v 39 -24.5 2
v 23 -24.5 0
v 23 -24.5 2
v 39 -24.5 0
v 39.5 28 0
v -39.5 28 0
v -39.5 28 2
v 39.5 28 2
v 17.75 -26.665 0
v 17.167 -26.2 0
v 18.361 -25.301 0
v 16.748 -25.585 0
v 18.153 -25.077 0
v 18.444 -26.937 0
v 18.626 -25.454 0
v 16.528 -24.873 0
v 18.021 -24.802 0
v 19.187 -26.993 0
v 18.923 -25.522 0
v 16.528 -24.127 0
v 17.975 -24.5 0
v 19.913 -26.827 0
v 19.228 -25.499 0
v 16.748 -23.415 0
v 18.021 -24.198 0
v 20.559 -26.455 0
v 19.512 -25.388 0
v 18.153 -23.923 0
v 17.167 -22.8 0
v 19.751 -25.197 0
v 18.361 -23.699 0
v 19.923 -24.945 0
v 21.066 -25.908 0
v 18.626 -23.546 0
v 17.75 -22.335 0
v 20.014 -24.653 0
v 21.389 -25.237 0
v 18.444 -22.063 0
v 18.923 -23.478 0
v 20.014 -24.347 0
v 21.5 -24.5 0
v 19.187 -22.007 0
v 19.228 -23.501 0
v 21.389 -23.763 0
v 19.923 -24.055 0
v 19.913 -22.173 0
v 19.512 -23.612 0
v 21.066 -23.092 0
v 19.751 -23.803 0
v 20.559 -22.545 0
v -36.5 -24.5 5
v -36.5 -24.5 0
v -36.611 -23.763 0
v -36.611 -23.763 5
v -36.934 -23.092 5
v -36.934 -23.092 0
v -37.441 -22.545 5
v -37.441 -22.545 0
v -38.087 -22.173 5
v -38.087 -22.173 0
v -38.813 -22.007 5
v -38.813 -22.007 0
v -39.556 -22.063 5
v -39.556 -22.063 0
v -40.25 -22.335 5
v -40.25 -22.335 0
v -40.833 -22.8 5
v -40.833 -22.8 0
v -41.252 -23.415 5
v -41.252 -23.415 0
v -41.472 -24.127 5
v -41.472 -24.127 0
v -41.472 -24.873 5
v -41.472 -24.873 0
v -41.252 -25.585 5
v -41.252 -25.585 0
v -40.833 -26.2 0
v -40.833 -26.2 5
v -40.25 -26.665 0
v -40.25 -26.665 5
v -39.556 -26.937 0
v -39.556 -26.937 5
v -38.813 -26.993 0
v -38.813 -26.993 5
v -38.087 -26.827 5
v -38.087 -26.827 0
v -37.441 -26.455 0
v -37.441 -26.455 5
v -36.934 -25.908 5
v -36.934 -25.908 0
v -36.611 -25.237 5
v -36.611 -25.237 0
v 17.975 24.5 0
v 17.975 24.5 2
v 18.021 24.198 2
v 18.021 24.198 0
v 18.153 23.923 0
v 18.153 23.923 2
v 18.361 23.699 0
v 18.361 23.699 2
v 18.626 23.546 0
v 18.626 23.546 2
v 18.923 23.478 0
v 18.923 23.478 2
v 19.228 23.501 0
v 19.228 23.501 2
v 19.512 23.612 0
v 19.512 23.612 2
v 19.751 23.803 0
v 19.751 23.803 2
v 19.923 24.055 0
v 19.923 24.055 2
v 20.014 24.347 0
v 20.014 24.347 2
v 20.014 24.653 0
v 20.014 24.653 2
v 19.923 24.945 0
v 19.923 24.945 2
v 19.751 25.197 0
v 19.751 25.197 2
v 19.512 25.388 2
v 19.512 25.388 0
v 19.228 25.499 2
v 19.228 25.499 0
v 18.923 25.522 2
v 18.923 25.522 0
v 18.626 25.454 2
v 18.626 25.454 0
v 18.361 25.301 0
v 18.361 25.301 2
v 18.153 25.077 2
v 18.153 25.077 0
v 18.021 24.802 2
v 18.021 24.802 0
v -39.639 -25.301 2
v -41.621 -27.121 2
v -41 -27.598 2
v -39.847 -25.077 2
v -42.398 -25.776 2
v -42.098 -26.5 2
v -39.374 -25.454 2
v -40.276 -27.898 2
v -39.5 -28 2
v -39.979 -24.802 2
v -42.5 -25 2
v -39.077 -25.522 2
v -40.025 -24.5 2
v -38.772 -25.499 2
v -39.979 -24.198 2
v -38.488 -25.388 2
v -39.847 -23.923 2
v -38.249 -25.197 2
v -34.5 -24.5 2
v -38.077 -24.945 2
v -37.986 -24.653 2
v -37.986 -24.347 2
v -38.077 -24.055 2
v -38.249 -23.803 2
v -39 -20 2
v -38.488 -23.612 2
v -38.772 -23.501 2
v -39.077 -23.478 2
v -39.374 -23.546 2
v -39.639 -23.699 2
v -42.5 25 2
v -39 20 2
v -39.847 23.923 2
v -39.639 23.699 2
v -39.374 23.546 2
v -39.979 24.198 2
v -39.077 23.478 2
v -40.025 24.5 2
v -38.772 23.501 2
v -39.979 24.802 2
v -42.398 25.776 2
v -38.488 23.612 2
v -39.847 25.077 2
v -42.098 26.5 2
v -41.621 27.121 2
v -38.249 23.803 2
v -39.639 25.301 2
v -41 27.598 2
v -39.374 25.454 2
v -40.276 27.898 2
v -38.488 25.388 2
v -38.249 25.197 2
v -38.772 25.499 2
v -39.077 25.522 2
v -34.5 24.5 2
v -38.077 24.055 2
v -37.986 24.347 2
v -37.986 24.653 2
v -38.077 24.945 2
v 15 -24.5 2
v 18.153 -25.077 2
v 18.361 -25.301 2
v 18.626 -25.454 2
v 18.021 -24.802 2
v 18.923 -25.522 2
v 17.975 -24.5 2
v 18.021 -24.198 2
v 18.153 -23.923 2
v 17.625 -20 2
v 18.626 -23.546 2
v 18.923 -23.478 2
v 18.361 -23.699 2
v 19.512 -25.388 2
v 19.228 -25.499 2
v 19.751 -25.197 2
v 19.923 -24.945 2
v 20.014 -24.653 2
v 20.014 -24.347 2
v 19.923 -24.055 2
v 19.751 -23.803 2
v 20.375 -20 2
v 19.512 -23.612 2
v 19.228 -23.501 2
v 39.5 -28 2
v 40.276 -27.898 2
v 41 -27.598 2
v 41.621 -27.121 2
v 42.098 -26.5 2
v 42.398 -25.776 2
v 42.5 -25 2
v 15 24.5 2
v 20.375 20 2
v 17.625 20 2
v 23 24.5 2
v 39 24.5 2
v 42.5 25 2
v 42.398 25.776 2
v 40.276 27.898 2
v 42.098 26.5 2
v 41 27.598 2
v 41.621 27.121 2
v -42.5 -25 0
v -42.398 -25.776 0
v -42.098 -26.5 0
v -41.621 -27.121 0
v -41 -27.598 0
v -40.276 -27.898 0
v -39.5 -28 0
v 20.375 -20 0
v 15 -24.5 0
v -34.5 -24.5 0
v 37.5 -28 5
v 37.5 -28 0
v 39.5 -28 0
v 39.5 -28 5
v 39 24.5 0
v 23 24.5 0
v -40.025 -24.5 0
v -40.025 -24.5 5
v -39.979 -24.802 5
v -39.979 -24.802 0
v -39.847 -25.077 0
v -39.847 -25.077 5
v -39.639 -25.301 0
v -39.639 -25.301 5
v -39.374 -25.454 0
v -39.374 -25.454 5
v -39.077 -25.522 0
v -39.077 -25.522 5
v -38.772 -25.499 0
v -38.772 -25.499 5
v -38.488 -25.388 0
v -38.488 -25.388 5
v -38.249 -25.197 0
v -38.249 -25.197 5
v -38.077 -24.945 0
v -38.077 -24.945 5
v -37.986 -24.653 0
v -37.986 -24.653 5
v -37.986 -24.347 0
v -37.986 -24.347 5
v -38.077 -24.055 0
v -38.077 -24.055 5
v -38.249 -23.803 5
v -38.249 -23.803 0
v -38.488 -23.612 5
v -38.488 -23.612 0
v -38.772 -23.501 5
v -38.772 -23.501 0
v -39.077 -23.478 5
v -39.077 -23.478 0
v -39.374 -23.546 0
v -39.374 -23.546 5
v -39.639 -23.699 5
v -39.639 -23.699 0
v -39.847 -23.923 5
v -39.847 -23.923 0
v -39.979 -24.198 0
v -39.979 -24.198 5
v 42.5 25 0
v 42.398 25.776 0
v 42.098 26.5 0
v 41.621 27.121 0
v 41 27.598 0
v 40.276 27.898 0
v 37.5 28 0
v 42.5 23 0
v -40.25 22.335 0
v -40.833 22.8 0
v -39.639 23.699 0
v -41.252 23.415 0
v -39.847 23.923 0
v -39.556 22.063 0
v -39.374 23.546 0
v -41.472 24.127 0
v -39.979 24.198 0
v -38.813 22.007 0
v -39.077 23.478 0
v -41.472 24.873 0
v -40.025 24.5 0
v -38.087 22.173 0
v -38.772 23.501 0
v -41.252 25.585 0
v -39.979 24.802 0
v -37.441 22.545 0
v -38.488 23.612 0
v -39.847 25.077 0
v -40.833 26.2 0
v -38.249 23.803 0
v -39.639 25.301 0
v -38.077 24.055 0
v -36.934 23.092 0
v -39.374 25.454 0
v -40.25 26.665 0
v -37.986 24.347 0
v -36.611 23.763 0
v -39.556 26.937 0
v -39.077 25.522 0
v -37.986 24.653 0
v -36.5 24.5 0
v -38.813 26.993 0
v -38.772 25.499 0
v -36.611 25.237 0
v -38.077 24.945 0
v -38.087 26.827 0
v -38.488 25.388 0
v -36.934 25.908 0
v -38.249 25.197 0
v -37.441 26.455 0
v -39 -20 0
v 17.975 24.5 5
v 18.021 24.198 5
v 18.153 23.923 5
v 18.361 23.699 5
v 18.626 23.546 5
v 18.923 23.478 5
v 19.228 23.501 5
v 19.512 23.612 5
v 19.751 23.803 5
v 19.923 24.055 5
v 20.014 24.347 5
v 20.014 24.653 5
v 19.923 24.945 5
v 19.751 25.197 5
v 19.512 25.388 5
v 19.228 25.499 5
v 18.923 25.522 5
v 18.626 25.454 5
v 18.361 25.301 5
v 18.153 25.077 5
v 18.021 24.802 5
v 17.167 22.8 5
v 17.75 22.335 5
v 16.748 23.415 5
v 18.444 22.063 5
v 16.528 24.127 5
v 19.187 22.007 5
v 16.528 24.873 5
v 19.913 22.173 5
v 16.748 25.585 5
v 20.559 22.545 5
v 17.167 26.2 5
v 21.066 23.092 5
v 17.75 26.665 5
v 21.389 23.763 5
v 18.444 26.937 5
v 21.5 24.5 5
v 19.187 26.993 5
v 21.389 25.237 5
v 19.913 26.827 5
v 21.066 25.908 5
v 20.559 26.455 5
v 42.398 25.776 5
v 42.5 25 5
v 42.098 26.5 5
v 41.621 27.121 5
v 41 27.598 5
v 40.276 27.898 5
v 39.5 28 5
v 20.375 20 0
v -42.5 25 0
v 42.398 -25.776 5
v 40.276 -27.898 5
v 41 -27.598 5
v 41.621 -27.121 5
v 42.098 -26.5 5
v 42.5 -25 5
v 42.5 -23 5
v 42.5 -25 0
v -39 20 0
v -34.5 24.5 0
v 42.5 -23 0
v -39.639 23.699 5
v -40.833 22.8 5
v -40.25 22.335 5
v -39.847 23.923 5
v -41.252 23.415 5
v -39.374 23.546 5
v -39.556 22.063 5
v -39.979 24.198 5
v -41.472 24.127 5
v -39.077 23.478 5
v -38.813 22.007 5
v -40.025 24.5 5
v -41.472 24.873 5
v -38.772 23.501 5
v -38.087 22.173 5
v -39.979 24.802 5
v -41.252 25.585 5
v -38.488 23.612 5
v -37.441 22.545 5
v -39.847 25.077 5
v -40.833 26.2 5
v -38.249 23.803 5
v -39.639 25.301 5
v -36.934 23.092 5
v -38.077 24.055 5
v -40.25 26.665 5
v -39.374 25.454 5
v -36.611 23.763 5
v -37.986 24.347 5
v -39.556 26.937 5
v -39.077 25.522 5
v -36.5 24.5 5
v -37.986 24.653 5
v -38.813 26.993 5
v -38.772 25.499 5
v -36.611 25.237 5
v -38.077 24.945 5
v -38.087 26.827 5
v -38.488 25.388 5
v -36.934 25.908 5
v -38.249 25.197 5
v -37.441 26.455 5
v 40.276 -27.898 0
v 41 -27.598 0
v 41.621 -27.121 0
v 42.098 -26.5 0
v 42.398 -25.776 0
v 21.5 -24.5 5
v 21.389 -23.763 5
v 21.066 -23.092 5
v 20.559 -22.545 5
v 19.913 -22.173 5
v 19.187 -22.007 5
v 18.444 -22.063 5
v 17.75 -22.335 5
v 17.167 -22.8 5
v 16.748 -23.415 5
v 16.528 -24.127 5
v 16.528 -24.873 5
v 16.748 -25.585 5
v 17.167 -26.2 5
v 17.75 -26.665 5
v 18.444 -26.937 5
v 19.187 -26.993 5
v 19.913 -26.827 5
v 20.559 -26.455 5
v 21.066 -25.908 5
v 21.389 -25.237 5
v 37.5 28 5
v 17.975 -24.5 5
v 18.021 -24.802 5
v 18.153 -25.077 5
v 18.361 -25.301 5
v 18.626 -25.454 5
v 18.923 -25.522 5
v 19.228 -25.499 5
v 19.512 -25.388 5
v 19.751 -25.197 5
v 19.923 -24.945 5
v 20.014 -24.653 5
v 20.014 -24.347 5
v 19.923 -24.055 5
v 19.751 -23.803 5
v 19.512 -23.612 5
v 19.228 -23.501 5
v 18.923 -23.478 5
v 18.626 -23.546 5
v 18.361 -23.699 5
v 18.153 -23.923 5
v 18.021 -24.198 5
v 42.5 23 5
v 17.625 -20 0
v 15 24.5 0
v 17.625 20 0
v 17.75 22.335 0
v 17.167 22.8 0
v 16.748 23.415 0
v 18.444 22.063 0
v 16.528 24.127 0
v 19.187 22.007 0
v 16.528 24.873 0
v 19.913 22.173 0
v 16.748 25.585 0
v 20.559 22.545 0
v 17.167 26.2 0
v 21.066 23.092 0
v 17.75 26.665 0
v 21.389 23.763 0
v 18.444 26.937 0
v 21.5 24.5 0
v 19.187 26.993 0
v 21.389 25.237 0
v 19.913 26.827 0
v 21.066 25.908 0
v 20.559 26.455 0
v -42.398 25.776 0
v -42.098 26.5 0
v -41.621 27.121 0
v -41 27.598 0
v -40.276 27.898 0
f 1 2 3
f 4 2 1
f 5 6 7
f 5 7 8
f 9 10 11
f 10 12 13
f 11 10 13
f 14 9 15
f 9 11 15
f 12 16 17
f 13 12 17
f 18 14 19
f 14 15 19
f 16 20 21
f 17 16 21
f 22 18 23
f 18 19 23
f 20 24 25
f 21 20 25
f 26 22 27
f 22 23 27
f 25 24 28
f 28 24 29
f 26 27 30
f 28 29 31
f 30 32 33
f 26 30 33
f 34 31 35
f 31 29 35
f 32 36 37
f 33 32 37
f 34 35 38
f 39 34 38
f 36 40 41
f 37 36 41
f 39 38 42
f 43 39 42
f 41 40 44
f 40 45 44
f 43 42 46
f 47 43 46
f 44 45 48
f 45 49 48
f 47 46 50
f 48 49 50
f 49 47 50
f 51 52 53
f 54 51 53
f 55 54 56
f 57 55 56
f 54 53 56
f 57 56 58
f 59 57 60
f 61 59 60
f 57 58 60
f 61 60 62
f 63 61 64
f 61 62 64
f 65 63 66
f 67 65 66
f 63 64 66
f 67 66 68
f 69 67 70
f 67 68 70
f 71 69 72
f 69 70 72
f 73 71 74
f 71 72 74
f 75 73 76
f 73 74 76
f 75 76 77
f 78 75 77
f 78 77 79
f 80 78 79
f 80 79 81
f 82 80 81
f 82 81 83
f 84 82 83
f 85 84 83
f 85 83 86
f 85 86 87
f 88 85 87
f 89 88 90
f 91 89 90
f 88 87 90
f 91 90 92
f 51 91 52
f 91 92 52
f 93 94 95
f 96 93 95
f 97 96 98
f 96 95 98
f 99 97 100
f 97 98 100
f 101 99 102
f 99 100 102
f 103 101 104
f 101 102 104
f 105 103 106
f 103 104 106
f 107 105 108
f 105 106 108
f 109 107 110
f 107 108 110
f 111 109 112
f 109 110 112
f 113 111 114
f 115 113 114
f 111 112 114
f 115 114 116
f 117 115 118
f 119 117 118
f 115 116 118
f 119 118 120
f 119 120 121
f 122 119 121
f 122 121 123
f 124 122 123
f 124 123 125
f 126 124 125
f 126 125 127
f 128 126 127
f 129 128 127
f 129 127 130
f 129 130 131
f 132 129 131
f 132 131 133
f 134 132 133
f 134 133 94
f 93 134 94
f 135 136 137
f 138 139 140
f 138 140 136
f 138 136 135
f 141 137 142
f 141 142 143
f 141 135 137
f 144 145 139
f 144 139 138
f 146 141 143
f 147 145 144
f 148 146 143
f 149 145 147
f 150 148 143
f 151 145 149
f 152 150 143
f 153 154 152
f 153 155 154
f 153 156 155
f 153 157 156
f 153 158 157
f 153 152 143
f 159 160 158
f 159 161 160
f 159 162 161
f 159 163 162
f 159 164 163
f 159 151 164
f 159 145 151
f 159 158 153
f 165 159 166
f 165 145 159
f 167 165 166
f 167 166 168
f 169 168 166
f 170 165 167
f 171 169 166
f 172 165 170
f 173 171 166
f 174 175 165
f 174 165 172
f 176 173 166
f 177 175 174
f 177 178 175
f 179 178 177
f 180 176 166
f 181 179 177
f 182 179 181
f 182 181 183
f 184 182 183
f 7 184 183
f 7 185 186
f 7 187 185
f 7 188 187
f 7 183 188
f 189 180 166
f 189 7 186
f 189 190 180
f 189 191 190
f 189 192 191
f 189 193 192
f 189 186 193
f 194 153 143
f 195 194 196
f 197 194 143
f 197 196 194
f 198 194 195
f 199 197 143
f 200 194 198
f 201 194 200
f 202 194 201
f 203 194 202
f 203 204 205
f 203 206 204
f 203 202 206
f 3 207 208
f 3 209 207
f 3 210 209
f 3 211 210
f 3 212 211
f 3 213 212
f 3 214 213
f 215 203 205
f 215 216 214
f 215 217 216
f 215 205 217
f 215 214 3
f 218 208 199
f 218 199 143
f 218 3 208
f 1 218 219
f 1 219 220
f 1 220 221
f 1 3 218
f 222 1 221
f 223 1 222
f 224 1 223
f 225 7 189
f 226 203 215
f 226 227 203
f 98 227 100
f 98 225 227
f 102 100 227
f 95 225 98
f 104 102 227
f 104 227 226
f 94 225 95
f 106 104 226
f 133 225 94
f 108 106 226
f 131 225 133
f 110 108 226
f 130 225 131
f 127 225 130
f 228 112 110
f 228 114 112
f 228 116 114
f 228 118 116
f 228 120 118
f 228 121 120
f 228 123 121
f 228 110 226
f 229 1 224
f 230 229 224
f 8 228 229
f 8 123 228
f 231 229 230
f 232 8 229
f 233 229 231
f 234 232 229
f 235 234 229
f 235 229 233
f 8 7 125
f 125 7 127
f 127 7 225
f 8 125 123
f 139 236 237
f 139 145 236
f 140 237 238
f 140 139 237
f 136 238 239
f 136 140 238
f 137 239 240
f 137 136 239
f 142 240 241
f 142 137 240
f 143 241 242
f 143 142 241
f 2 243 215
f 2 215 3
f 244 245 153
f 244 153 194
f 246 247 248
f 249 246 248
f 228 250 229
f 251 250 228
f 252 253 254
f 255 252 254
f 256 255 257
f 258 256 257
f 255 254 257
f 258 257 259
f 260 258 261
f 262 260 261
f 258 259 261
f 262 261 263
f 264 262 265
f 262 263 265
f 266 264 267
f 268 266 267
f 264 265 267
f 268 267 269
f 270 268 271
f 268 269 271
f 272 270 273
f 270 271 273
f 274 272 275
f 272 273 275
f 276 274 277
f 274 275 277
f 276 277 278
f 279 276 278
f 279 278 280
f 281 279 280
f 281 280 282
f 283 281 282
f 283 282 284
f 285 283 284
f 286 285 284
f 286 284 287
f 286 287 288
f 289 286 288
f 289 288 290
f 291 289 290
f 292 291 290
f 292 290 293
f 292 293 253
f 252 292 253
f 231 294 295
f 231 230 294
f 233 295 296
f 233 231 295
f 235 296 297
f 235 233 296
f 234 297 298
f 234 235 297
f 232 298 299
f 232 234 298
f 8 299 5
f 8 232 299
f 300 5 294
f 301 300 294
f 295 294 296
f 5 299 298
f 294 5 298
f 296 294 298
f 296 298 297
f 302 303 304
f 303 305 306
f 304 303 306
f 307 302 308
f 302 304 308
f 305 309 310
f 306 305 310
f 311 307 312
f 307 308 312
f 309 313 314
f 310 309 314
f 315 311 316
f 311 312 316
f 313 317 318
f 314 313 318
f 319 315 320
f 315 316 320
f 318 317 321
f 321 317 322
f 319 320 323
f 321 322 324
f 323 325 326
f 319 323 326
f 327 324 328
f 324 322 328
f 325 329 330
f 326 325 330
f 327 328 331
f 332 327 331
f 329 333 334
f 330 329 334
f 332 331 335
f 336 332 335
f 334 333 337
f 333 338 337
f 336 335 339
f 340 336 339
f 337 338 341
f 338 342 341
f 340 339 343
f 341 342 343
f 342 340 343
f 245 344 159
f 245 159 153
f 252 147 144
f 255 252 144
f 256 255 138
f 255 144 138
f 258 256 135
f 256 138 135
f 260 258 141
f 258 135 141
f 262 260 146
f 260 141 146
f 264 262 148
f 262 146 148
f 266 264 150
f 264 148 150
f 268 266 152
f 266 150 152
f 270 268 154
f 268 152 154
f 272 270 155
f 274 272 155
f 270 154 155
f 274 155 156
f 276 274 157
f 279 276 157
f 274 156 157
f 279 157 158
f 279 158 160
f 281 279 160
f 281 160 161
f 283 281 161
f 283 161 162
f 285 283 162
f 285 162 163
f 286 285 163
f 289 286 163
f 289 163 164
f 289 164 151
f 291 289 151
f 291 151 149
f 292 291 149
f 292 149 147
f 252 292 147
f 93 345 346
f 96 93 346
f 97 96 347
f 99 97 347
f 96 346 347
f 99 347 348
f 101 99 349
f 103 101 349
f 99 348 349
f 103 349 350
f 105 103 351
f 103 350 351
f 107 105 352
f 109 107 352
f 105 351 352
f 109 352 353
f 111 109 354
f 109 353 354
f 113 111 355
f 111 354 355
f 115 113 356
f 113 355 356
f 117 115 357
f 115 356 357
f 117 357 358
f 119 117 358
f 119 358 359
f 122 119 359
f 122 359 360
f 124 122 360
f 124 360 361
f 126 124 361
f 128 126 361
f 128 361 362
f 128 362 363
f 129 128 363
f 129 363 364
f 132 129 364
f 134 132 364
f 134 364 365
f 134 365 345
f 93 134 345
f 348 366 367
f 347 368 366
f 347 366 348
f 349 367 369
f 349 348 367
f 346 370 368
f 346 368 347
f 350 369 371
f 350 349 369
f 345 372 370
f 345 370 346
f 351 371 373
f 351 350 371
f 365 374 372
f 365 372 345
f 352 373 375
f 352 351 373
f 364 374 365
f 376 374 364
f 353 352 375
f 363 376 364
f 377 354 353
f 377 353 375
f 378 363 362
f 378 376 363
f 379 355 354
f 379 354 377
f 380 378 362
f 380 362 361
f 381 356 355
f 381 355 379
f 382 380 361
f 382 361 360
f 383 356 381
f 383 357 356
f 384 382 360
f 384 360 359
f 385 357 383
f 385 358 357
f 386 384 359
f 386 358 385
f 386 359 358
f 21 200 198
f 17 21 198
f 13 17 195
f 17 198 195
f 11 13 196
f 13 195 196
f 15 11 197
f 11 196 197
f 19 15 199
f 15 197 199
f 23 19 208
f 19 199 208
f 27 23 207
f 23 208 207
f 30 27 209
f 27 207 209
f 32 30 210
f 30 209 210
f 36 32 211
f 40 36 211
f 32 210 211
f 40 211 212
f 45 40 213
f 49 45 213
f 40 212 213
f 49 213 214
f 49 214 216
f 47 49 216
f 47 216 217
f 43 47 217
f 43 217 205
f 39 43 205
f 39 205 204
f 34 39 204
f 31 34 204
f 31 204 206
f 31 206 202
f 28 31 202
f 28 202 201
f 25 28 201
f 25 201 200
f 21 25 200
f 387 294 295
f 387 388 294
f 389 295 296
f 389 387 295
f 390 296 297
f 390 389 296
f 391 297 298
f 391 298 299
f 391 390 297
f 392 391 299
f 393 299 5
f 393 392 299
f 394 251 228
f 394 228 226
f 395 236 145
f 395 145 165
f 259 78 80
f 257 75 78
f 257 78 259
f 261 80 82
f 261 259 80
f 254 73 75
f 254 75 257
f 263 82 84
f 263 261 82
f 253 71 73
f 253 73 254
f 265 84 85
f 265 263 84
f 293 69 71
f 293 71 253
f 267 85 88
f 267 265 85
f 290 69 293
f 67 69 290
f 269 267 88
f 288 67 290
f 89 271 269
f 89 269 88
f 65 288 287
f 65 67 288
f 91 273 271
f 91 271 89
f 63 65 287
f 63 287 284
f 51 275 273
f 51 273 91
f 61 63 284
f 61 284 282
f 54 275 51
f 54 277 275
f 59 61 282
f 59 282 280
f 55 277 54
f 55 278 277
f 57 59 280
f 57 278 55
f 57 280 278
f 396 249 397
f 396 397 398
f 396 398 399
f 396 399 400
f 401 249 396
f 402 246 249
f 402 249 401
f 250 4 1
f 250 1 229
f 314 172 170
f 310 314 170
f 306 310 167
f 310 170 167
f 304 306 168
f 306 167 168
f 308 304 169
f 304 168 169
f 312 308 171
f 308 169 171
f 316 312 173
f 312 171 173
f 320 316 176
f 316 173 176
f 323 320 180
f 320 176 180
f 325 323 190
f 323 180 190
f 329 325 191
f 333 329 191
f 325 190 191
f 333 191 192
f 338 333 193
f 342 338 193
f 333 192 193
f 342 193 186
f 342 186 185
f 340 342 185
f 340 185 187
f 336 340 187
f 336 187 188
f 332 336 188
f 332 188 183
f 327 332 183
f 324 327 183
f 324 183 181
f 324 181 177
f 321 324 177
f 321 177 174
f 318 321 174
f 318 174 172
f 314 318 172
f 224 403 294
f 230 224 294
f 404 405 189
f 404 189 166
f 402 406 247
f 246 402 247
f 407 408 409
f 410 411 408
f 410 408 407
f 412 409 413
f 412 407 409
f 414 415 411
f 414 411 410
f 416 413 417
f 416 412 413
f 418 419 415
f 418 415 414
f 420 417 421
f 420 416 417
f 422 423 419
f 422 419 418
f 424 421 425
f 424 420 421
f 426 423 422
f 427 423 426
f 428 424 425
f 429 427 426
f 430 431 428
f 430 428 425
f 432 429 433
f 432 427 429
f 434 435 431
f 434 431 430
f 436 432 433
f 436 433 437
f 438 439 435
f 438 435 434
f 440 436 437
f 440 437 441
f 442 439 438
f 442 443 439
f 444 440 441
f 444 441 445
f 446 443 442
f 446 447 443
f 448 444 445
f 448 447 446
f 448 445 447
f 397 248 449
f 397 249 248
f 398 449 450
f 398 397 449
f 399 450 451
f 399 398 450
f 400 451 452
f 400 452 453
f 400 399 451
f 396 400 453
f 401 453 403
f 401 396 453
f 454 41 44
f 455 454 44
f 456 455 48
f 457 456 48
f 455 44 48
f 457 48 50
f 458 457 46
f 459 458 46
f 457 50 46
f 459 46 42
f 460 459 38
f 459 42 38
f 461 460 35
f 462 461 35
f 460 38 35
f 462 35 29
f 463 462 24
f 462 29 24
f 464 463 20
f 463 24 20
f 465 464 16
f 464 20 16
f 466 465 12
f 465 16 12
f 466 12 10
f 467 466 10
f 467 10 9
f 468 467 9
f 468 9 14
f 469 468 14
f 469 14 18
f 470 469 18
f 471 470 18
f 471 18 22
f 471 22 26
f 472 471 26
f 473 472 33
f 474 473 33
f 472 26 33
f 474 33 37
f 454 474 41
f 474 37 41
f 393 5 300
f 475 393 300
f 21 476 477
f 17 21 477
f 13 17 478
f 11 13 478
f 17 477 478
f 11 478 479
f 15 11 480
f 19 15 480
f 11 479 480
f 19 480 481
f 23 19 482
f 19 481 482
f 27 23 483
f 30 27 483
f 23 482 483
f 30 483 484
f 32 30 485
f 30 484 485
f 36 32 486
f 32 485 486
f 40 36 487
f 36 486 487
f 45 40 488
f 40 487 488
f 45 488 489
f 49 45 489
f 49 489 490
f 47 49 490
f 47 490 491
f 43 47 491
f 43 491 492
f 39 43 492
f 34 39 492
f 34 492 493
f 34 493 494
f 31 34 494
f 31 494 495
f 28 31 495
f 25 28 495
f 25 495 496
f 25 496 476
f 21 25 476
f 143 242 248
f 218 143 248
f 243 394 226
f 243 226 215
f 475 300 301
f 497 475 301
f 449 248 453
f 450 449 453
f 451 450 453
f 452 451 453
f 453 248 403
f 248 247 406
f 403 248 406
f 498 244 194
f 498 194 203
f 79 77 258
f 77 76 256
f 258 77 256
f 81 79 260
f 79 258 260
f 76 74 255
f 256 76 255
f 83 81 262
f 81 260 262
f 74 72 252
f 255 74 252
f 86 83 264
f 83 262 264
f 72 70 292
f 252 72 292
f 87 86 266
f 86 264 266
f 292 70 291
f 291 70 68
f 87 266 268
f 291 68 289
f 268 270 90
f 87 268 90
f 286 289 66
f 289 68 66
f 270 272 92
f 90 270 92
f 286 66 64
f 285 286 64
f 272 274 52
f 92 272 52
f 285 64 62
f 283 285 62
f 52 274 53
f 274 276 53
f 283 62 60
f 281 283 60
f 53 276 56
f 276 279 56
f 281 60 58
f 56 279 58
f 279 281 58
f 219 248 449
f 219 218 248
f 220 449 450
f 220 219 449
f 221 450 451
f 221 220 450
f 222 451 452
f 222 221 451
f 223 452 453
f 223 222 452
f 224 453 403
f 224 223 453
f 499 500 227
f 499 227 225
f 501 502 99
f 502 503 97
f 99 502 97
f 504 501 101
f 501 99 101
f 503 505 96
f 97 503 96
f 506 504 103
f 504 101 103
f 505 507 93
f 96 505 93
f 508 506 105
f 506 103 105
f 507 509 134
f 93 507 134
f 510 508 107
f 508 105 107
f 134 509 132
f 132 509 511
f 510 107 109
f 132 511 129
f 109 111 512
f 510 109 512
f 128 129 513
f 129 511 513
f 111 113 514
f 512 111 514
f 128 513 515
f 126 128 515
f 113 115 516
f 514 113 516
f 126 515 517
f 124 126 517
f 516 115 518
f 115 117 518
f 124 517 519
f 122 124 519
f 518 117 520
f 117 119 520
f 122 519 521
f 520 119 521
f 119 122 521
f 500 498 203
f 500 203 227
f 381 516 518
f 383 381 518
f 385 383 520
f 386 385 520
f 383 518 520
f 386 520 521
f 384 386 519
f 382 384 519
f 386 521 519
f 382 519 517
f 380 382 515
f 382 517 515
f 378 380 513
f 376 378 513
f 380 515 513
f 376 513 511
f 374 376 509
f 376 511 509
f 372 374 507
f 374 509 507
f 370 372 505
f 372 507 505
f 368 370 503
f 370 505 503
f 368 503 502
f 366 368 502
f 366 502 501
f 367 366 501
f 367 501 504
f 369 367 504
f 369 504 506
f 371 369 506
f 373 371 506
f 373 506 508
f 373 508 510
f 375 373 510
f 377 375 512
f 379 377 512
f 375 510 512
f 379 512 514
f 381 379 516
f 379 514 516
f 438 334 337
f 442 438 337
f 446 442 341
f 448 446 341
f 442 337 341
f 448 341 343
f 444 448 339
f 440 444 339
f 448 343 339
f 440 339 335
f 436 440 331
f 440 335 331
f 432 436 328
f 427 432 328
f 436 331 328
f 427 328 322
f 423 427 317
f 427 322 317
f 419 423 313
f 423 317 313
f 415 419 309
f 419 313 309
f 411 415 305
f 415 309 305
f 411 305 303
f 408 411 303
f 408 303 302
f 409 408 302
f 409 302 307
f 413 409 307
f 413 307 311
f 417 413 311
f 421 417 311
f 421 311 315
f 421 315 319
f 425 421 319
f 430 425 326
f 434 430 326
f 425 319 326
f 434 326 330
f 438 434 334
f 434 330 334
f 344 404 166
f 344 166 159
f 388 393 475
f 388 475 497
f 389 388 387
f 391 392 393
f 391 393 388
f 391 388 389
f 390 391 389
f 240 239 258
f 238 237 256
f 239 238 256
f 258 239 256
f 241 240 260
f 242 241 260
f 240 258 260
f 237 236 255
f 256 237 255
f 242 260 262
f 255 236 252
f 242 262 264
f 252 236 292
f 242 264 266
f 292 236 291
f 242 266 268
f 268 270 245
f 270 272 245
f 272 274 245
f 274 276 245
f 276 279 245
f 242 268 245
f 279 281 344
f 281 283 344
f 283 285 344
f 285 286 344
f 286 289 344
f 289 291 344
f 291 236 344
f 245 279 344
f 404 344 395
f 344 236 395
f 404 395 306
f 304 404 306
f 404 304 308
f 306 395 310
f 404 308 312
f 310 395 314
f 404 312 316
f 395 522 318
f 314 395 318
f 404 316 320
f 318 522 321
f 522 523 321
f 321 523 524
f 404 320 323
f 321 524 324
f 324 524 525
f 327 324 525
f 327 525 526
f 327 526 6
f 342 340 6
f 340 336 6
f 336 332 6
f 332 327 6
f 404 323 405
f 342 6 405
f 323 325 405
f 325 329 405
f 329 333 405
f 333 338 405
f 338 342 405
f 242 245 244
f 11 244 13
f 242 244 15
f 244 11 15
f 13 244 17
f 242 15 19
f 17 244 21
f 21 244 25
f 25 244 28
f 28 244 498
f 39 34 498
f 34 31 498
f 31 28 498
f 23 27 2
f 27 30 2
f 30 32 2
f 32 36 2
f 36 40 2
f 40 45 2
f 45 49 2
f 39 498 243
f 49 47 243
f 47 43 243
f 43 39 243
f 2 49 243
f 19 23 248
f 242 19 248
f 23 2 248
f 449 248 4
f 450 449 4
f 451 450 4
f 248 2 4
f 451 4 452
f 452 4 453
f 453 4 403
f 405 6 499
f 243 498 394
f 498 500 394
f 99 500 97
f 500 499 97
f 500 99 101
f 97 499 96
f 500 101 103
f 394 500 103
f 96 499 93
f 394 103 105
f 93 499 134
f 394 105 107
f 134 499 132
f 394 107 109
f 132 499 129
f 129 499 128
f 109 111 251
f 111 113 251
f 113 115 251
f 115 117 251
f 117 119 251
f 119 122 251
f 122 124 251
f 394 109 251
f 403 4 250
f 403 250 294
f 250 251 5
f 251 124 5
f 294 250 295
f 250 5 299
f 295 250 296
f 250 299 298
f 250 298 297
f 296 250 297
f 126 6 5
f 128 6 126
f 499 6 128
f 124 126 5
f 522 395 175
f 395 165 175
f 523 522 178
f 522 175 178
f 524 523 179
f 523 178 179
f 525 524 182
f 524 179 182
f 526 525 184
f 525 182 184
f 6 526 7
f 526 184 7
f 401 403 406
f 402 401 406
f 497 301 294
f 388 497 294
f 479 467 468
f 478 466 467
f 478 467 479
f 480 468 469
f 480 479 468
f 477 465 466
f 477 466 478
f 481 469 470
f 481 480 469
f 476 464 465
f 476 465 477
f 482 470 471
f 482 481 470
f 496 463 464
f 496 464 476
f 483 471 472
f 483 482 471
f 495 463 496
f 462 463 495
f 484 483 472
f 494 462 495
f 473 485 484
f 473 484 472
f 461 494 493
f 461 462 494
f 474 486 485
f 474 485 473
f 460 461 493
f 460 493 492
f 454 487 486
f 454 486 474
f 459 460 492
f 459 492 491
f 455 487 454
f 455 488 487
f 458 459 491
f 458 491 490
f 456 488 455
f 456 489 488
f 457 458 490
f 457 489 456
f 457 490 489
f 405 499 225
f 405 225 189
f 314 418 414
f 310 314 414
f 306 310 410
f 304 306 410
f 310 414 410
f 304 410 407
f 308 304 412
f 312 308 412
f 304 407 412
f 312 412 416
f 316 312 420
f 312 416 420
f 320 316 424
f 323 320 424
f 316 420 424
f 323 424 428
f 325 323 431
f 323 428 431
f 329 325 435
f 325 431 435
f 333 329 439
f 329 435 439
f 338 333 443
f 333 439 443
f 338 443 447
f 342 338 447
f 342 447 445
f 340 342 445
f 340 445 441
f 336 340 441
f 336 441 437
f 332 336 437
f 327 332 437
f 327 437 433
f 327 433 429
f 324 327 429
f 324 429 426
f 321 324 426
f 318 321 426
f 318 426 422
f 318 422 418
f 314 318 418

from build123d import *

# Parameters (mm, degrees)
F0_W       = 85
F0_H       = 56
F1_DEPTH   = 2
F2_R       = 3
F3_R       = 2.5
F4_DEPTH   = 5
F5_D       = 2.05
F5_DEPTH   = 10
F5_2_D     = 2.05
F5_2_DEPTH = 10
F7_DEPTH   = 3
F8_R       = 3


with BuildPart() as f1:
    # F0 (on Top) → F1 (new body)
    with BuildSketch(Plane.XY):
        Rectangle(F0_W, F0_H)
    extrude(amount=F1_DEPTH)

    # F2
    f2_edges = [f1.edges().sort_by_distance(p)[0] for p in [
        (-42.5, -28, 1),
        (-42.5, 28, 1),
        (42.5, -28, 1),
        (42.5, 28, 1),
    ]]
    fillet(f2_edges, radius=F2_R)

    # F5
    with Locations(Plane(origin=(0, 0, 0), x_dir=(1, 0, 0), z_dir=(0, 0, -1))):
        with Locations((-39, 24.5), (19, 24.5), (19, -24.5), (-39, -24.5)):
            Hole(F5_D / 2, depth=F5_DEPTH)

    # F6 (on face) → F7 (cut)
    with BuildSketch(Plane.XY):
        Polygon((-34.5, 24.5), (-39, 20), (-39, -20), (-34.5, -24.5), (15, -24.5), (17.625, -20), (17.625, 20), (15, 24.5), align=None)
        Polygon((23, 24.5), (20.375, 20), (20.375, -20), (23, -24.5), (39, -24.5), (39, 24.5), align=None)
    extrude(amount=F7_DEPTH, mode=Mode.SUBTRACT)


with BuildPart() as f4:
    # F3 (on Top) → F4 (new body)
    with BuildSketch(Plane.XY):
        with Locations((-39, -24.5)):
            Circle(F3_R)
        with Locations((-39, 24.5)):
            Circle(F3_R)
        with Locations((19, -24.5)):
            Circle(F3_R)
        with Locations((19, 24.5)):
            Circle(F3_R)
        Polygon((37.5, -28), (42.5, -28), (42.5, -23), align=None)
        Polygon((42.5, 23), (42.5, 28), (37.5, 28), align=None)
    extrude(amount=F4_DEPTH)

    # F5#2
    with Locations(Plane(origin=(0, 0, 0), x_dir=(1, 0, 0), z_dir=(0, 0, -1))):
        with Locations((-39, 24.5), (19, 24.5), (19, -24.5), (-39, -24.5)):
            Hole(F5_2_D / 2, depth=F5_2_DEPTH)

    # F8
    f8_edges = [f4.edges().sort_by_distance(p)[0] for p in [
        (42.5, 28, 2.5),
        (42.5, -28, 2.5),
    ]]
    fillet(f8_edges, radius=F8_R)


solid = Compound([f1.part, f4.part])
